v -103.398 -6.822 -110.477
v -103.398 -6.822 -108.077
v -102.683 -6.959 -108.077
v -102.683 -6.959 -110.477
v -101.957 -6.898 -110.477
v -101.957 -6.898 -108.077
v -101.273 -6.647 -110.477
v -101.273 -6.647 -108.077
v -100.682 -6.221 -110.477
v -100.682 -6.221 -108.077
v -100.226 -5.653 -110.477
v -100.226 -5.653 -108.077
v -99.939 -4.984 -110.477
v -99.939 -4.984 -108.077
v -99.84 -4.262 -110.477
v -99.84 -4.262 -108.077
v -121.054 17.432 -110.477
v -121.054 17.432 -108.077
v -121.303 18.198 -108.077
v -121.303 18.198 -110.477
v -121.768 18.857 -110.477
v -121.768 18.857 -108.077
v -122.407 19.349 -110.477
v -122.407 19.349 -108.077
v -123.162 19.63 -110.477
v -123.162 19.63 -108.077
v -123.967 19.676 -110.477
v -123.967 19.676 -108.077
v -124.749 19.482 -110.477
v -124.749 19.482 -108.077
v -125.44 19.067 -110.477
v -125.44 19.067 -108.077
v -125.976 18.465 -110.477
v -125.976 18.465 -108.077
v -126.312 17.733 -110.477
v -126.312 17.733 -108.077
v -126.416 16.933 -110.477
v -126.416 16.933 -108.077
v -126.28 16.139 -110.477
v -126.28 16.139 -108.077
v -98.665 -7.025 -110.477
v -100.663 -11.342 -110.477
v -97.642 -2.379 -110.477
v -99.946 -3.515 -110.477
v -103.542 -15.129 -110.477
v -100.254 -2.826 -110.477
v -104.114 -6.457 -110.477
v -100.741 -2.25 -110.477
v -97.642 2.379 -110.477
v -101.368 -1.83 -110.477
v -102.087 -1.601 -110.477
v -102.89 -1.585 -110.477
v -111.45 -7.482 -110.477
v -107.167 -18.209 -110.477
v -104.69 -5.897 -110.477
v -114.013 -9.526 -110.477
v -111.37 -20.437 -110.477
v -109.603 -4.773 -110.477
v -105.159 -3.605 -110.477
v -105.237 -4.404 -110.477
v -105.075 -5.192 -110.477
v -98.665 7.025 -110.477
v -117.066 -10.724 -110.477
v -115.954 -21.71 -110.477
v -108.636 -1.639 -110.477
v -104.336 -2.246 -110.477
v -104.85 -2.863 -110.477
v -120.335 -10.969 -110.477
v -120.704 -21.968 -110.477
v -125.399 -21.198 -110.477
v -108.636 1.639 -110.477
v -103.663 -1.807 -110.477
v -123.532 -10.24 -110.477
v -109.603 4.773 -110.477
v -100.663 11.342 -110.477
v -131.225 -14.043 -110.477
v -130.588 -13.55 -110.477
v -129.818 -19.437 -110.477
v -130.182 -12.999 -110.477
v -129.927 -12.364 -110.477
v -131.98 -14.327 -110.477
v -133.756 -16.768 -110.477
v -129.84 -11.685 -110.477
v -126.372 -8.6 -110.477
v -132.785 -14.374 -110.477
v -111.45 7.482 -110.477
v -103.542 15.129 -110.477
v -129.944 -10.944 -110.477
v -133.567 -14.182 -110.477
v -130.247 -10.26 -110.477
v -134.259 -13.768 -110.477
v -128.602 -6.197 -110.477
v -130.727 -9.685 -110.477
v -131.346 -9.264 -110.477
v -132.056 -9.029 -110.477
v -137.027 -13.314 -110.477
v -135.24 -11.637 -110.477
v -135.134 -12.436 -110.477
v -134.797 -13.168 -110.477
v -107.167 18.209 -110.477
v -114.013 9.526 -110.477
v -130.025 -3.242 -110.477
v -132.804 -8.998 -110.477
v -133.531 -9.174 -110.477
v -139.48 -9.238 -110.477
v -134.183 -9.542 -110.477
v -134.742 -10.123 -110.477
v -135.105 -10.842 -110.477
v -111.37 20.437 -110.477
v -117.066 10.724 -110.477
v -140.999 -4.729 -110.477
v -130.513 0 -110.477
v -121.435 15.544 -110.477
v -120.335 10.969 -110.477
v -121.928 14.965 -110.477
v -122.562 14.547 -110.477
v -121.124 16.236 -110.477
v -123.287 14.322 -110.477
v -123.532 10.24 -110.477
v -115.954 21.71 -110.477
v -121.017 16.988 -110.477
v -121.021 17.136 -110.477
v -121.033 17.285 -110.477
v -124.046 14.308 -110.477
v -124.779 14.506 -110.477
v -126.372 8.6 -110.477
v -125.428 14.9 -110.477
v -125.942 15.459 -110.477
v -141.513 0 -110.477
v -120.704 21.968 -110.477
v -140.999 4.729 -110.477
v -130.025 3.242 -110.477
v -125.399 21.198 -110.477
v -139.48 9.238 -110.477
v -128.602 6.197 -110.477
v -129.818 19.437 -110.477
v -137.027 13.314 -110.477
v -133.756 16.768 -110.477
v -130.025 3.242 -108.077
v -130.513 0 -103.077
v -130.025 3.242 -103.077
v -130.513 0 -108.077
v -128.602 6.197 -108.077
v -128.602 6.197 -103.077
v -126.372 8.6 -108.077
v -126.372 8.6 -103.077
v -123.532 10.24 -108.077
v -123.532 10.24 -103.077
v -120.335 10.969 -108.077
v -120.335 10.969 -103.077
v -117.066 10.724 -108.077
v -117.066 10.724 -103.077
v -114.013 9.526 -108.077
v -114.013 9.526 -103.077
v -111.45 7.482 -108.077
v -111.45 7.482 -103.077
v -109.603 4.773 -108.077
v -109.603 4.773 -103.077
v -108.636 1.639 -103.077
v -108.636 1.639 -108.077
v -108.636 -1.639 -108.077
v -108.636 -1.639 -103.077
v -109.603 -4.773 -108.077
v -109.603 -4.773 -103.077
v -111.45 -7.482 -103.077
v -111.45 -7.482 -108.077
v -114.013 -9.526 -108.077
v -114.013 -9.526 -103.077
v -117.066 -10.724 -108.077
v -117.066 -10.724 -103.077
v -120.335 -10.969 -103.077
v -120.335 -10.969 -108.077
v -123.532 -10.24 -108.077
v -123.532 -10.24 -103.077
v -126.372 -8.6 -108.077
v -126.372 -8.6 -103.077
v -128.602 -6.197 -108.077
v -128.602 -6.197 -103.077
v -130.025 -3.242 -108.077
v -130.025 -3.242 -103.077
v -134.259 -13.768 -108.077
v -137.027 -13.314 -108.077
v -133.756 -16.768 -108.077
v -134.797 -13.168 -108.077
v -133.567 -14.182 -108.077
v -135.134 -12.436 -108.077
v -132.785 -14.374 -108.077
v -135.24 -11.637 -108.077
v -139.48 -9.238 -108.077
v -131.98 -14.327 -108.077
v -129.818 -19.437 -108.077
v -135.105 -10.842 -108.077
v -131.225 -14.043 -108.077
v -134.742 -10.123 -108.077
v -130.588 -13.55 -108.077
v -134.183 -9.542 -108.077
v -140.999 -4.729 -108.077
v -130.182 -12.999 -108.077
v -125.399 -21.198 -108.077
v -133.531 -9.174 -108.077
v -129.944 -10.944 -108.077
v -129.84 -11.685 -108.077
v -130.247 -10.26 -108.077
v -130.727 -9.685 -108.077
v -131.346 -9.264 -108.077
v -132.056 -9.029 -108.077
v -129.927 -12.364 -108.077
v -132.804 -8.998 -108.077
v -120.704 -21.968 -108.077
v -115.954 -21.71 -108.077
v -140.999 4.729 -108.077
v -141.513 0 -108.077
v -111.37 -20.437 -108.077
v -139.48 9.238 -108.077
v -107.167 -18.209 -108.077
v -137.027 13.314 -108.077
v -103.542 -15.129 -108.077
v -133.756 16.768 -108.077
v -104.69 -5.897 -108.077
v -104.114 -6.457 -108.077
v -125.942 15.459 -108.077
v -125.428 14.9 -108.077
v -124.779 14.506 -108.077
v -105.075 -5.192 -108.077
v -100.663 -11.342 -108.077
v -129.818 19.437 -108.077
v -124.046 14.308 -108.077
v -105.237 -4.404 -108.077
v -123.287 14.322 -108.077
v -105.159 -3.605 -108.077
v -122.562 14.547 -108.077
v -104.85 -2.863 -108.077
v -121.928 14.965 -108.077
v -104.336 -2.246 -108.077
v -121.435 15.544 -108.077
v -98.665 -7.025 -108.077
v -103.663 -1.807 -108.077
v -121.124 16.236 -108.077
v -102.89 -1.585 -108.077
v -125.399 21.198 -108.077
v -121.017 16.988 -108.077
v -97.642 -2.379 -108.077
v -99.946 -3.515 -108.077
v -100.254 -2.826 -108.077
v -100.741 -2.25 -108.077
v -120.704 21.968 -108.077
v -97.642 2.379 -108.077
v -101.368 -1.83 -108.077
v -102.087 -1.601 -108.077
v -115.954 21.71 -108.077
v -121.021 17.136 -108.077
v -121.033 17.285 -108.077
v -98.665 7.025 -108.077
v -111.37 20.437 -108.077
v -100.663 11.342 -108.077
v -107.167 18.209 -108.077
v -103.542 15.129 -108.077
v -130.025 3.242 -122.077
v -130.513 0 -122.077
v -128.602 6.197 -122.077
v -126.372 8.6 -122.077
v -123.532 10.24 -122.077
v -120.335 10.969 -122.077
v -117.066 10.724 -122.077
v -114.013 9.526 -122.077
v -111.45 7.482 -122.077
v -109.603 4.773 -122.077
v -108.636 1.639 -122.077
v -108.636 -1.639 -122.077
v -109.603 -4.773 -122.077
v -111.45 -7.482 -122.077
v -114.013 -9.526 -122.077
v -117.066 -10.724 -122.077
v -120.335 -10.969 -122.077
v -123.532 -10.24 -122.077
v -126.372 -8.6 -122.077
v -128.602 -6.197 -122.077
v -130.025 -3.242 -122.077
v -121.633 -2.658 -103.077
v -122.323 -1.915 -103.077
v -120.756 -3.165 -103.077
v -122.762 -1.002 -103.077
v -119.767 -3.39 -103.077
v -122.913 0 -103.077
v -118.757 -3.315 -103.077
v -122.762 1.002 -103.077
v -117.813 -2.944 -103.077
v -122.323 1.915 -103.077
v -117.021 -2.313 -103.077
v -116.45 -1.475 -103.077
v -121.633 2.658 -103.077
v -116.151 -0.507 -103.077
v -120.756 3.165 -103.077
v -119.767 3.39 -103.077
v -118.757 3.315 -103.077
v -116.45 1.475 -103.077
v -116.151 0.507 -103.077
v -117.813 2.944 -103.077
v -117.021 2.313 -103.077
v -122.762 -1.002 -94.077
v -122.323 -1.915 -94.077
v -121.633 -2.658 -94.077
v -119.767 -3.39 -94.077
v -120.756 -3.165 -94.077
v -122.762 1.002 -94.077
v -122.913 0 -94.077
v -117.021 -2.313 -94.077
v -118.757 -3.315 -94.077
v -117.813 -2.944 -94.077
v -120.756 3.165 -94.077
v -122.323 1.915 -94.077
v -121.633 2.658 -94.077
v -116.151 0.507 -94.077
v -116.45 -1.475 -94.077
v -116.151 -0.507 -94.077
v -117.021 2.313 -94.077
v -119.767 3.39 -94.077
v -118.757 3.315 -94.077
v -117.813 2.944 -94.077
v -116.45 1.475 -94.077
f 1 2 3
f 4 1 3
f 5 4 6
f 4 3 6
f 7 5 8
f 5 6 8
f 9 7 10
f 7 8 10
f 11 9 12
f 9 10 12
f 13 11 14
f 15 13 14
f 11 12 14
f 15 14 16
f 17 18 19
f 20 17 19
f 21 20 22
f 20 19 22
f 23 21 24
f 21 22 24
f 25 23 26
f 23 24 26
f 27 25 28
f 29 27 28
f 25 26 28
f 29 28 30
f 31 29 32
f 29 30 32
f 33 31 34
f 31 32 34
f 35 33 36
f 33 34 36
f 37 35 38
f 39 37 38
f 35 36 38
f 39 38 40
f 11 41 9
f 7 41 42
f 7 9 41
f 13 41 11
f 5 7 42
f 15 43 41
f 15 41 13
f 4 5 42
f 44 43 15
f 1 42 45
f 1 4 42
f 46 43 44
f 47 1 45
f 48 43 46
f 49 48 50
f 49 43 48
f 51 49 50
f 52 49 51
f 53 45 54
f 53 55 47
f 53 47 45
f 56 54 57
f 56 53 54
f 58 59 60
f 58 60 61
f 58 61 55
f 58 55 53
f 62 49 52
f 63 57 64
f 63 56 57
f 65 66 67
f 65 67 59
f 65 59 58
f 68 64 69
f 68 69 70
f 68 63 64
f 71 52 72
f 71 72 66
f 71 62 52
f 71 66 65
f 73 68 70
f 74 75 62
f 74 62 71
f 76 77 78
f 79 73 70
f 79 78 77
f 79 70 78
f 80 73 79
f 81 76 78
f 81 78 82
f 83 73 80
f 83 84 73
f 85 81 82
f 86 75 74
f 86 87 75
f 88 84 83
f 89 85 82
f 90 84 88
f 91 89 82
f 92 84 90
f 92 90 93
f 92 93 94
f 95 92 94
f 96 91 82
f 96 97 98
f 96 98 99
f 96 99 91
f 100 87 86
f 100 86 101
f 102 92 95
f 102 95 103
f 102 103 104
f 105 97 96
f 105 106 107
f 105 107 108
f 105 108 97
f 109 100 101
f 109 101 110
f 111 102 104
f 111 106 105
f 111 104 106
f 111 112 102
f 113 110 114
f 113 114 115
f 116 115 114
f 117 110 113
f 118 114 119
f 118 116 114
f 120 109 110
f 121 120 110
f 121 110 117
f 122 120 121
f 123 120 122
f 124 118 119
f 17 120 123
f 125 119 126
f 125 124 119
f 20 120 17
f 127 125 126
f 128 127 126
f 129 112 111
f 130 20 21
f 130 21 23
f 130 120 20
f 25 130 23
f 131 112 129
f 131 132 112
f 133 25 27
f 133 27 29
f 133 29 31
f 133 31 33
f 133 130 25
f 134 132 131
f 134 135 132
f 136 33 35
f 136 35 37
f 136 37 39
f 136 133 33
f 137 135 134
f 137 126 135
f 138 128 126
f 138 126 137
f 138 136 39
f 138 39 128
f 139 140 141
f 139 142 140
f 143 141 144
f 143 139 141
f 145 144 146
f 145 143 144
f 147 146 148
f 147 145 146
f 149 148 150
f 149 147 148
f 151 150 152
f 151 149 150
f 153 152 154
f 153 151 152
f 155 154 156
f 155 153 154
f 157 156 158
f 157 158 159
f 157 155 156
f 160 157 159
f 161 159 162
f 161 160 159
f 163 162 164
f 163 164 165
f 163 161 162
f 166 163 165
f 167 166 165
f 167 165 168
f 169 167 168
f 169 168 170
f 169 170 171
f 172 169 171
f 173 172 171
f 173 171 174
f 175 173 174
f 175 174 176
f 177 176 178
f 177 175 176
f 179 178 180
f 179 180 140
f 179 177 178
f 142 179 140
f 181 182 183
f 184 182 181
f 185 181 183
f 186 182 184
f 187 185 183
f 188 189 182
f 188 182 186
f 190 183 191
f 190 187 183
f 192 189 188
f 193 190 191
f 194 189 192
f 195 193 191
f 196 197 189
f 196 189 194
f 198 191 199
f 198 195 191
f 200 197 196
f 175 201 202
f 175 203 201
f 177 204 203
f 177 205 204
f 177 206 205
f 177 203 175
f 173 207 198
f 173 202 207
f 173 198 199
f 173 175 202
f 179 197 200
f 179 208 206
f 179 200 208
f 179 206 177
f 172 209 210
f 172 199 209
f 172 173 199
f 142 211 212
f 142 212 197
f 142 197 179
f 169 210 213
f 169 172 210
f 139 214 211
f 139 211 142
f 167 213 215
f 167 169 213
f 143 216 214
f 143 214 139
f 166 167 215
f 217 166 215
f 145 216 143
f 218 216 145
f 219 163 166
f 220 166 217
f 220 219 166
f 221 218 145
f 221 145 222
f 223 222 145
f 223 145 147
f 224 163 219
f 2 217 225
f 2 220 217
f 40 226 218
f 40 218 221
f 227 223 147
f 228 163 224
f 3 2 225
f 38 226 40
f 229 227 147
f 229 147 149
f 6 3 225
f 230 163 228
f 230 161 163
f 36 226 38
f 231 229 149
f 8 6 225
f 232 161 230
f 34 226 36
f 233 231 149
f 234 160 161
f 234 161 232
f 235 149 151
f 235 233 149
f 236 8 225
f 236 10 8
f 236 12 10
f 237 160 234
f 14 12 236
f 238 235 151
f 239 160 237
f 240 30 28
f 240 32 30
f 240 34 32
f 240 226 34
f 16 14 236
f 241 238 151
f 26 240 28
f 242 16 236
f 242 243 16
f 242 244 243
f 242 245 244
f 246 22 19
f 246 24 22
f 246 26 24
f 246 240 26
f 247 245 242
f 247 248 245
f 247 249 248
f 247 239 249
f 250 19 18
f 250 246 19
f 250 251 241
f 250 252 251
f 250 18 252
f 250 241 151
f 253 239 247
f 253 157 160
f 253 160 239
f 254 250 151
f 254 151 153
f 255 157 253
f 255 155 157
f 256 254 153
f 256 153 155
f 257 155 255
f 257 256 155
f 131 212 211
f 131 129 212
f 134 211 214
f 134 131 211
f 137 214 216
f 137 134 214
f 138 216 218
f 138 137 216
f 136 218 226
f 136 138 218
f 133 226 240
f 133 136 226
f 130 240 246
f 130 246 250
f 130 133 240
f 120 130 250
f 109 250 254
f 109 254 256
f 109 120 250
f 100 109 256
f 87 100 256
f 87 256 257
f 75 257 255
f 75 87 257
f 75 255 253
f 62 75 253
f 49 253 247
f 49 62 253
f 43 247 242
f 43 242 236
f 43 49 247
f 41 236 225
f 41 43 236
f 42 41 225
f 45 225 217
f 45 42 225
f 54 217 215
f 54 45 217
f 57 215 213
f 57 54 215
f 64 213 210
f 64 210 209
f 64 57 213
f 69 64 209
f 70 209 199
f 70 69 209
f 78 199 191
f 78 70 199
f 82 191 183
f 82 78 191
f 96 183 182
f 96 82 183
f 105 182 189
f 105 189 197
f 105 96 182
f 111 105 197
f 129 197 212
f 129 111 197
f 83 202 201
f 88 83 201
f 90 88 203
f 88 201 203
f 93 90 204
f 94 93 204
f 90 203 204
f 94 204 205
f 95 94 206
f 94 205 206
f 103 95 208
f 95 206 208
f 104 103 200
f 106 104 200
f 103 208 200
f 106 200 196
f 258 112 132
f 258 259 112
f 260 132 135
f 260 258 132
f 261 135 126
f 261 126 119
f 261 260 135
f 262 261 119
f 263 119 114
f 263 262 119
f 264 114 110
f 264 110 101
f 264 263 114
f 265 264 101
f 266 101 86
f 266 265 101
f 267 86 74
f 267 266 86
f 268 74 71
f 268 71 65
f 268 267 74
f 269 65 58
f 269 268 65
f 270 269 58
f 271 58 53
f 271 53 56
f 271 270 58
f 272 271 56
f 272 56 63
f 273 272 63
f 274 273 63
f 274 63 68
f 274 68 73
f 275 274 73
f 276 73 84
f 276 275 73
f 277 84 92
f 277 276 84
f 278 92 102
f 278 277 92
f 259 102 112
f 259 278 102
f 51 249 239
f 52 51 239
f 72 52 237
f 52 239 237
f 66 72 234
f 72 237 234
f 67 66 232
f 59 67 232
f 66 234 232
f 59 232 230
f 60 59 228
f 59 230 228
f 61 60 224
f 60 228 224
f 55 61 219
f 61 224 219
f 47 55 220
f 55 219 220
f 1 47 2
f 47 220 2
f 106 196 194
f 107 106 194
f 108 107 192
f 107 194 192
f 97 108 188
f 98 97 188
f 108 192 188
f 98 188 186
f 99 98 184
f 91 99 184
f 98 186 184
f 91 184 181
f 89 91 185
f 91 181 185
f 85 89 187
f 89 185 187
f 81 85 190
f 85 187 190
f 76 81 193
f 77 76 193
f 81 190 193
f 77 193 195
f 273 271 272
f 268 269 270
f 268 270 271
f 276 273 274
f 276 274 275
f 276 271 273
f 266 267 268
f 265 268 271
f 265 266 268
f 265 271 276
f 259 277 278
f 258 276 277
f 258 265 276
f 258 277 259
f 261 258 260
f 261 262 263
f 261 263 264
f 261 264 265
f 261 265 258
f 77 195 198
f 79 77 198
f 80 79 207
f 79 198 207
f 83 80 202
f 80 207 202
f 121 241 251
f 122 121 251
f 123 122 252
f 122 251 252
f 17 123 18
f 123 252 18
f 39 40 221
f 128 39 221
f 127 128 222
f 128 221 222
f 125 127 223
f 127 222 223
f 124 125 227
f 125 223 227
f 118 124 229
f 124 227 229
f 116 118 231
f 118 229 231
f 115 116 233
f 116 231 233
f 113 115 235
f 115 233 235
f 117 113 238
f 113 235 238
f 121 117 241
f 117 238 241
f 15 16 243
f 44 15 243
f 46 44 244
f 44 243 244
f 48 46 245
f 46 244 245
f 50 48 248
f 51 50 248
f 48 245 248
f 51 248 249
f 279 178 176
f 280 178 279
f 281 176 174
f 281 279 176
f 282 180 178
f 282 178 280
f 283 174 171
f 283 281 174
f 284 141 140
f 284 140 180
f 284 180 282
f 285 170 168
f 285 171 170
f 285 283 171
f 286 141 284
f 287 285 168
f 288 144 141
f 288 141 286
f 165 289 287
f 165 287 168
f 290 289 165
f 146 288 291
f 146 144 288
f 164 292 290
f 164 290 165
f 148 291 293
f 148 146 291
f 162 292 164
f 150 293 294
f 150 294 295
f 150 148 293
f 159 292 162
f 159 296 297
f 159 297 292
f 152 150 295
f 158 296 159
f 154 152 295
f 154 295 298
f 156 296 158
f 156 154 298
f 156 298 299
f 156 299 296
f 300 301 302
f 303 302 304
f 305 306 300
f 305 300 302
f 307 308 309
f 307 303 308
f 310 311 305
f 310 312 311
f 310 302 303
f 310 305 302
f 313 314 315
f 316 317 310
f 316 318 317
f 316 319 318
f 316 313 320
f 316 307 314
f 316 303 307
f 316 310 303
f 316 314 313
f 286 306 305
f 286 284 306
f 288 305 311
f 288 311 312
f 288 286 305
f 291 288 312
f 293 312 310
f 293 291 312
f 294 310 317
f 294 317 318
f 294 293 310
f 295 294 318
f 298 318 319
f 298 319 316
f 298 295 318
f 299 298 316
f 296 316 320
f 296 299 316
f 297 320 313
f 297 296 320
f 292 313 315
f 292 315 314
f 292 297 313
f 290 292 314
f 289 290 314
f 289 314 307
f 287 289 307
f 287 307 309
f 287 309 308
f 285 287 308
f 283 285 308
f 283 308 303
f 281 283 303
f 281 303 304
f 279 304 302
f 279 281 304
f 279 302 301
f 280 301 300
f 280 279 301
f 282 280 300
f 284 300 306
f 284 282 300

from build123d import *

# Parameters (mm, degrees)
F3_DEPTH = 2.4


with BuildPart() as f1:
    # F0 (on Front) → F1 (revolve)
    with BuildSketch(Plane.XZ):
        Polygon((-130.5134040415, -110.4772146098), (-130.5134040415, -122.0772146098), (-119.5134040415, -122.0772146098), (-119.5134040415, -94.0772146098), (-122.9134040415, -94.0772146098), (-122.9134040415, -103.0772146098), (-130.5134040415, -103.0772146098), (-130.5134040415, -108.0772146098), (-141.5134040415, -108.0772146098), (-141.5134040415, -110.4772146098), align=None)
    revolve(axis=Axis((-119.5134040415, 0, -108.0772146098), (0, 0, -1)))

    # F2 (on face) → F3 (cut, through all)
    with BuildSketch(Plane.XY.offset(-108.0772146098)):
        with BuildLine():
            ThreePointArc((-121.0167680789, 16.9876935094), (-121.0259896486, 17.2106541317), (-121.0535913671, 17.4320917564))
            ThreePointArc((-121.0535913671, 17.4320917564), (-123.7167680789, 16.9876935094), (-126.27988757, 16.1389188194))
            ThreePointArc((-126.27988757, 16.1389188194), (-123.2868975321, 14.3221332844), (-121.0167680789, 16.9876935094))
        make_face()
        with BuildLine():
            ThreePointArc((-126.27988757, 16.1389188194), (-123.7167680789, 16.9876935094), (-121.0535913671, 17.4320917564))
            ThreePointArc((-121.0535913671, 17.4320917564), (-124.3652871018, 19.6086519366), (-126.27988757, 16.1389188194))
        make_face()
        with BuildLine():
            ThreePointArc((-99.8403964321, -4.2622778759), (-100.4770477105, -2.5208439688), (-102.0867609158, -1.6006590418))
            ThreePointArc((-102.0867609158, -1.6006590418), (-102.5403964321, -4.2622778759), (-103.3980588072, -6.8224370996))
            ThreePointArc((-103.3980588072, -6.8224370996), (-100.9633245271, -6.4538171082), (-99.8403964321, -4.2622778759))
        make_face()
        with BuildLine():
            ThreePointArc((-103.3980588072, -6.8224370996), (-102.5403964321, -4.2622778759), (-102.0867609158, -1.6006590418))
            ThreePointArc((-102.0867609158, -1.6006590418), (-105.1590890347, -3.6046692894), (-103.3980588072, -6.8224370996))
        make_face()
        with BuildLine():
            ThreePointArc((-129.8403964321, -11.6853527655), (-131.3455427368, -9.2641289744), (-134.1828591335, -9.5423837329))
            ThreePointArc((-134.1828591335, -9.5423837329), (-132.5403964321, -11.6853527655), (-130.5878381405, -13.550162707))
            ThreePointArc((-130.5878381405, -13.550162707), (-130.0342133395, -12.6898657352), (-129.8403964321, -11.6853527655))
        make_face()
        with BuildLine():
            ThreePointArc((-130.5878381405, -13.550162707), (-132.5403964321, -11.6853527655), (-134.1828591335, -9.5423837329))
            ThreePointArc((-134.1828591335, -9.5423837329), (-134.5502752581, -13.4882357636), (-130.5878381405, -13.550162707))
        make_face()
    extrude(amount=-F3_DEPTH, mode=Mode.SUBTRACT)


solid = f1.part
